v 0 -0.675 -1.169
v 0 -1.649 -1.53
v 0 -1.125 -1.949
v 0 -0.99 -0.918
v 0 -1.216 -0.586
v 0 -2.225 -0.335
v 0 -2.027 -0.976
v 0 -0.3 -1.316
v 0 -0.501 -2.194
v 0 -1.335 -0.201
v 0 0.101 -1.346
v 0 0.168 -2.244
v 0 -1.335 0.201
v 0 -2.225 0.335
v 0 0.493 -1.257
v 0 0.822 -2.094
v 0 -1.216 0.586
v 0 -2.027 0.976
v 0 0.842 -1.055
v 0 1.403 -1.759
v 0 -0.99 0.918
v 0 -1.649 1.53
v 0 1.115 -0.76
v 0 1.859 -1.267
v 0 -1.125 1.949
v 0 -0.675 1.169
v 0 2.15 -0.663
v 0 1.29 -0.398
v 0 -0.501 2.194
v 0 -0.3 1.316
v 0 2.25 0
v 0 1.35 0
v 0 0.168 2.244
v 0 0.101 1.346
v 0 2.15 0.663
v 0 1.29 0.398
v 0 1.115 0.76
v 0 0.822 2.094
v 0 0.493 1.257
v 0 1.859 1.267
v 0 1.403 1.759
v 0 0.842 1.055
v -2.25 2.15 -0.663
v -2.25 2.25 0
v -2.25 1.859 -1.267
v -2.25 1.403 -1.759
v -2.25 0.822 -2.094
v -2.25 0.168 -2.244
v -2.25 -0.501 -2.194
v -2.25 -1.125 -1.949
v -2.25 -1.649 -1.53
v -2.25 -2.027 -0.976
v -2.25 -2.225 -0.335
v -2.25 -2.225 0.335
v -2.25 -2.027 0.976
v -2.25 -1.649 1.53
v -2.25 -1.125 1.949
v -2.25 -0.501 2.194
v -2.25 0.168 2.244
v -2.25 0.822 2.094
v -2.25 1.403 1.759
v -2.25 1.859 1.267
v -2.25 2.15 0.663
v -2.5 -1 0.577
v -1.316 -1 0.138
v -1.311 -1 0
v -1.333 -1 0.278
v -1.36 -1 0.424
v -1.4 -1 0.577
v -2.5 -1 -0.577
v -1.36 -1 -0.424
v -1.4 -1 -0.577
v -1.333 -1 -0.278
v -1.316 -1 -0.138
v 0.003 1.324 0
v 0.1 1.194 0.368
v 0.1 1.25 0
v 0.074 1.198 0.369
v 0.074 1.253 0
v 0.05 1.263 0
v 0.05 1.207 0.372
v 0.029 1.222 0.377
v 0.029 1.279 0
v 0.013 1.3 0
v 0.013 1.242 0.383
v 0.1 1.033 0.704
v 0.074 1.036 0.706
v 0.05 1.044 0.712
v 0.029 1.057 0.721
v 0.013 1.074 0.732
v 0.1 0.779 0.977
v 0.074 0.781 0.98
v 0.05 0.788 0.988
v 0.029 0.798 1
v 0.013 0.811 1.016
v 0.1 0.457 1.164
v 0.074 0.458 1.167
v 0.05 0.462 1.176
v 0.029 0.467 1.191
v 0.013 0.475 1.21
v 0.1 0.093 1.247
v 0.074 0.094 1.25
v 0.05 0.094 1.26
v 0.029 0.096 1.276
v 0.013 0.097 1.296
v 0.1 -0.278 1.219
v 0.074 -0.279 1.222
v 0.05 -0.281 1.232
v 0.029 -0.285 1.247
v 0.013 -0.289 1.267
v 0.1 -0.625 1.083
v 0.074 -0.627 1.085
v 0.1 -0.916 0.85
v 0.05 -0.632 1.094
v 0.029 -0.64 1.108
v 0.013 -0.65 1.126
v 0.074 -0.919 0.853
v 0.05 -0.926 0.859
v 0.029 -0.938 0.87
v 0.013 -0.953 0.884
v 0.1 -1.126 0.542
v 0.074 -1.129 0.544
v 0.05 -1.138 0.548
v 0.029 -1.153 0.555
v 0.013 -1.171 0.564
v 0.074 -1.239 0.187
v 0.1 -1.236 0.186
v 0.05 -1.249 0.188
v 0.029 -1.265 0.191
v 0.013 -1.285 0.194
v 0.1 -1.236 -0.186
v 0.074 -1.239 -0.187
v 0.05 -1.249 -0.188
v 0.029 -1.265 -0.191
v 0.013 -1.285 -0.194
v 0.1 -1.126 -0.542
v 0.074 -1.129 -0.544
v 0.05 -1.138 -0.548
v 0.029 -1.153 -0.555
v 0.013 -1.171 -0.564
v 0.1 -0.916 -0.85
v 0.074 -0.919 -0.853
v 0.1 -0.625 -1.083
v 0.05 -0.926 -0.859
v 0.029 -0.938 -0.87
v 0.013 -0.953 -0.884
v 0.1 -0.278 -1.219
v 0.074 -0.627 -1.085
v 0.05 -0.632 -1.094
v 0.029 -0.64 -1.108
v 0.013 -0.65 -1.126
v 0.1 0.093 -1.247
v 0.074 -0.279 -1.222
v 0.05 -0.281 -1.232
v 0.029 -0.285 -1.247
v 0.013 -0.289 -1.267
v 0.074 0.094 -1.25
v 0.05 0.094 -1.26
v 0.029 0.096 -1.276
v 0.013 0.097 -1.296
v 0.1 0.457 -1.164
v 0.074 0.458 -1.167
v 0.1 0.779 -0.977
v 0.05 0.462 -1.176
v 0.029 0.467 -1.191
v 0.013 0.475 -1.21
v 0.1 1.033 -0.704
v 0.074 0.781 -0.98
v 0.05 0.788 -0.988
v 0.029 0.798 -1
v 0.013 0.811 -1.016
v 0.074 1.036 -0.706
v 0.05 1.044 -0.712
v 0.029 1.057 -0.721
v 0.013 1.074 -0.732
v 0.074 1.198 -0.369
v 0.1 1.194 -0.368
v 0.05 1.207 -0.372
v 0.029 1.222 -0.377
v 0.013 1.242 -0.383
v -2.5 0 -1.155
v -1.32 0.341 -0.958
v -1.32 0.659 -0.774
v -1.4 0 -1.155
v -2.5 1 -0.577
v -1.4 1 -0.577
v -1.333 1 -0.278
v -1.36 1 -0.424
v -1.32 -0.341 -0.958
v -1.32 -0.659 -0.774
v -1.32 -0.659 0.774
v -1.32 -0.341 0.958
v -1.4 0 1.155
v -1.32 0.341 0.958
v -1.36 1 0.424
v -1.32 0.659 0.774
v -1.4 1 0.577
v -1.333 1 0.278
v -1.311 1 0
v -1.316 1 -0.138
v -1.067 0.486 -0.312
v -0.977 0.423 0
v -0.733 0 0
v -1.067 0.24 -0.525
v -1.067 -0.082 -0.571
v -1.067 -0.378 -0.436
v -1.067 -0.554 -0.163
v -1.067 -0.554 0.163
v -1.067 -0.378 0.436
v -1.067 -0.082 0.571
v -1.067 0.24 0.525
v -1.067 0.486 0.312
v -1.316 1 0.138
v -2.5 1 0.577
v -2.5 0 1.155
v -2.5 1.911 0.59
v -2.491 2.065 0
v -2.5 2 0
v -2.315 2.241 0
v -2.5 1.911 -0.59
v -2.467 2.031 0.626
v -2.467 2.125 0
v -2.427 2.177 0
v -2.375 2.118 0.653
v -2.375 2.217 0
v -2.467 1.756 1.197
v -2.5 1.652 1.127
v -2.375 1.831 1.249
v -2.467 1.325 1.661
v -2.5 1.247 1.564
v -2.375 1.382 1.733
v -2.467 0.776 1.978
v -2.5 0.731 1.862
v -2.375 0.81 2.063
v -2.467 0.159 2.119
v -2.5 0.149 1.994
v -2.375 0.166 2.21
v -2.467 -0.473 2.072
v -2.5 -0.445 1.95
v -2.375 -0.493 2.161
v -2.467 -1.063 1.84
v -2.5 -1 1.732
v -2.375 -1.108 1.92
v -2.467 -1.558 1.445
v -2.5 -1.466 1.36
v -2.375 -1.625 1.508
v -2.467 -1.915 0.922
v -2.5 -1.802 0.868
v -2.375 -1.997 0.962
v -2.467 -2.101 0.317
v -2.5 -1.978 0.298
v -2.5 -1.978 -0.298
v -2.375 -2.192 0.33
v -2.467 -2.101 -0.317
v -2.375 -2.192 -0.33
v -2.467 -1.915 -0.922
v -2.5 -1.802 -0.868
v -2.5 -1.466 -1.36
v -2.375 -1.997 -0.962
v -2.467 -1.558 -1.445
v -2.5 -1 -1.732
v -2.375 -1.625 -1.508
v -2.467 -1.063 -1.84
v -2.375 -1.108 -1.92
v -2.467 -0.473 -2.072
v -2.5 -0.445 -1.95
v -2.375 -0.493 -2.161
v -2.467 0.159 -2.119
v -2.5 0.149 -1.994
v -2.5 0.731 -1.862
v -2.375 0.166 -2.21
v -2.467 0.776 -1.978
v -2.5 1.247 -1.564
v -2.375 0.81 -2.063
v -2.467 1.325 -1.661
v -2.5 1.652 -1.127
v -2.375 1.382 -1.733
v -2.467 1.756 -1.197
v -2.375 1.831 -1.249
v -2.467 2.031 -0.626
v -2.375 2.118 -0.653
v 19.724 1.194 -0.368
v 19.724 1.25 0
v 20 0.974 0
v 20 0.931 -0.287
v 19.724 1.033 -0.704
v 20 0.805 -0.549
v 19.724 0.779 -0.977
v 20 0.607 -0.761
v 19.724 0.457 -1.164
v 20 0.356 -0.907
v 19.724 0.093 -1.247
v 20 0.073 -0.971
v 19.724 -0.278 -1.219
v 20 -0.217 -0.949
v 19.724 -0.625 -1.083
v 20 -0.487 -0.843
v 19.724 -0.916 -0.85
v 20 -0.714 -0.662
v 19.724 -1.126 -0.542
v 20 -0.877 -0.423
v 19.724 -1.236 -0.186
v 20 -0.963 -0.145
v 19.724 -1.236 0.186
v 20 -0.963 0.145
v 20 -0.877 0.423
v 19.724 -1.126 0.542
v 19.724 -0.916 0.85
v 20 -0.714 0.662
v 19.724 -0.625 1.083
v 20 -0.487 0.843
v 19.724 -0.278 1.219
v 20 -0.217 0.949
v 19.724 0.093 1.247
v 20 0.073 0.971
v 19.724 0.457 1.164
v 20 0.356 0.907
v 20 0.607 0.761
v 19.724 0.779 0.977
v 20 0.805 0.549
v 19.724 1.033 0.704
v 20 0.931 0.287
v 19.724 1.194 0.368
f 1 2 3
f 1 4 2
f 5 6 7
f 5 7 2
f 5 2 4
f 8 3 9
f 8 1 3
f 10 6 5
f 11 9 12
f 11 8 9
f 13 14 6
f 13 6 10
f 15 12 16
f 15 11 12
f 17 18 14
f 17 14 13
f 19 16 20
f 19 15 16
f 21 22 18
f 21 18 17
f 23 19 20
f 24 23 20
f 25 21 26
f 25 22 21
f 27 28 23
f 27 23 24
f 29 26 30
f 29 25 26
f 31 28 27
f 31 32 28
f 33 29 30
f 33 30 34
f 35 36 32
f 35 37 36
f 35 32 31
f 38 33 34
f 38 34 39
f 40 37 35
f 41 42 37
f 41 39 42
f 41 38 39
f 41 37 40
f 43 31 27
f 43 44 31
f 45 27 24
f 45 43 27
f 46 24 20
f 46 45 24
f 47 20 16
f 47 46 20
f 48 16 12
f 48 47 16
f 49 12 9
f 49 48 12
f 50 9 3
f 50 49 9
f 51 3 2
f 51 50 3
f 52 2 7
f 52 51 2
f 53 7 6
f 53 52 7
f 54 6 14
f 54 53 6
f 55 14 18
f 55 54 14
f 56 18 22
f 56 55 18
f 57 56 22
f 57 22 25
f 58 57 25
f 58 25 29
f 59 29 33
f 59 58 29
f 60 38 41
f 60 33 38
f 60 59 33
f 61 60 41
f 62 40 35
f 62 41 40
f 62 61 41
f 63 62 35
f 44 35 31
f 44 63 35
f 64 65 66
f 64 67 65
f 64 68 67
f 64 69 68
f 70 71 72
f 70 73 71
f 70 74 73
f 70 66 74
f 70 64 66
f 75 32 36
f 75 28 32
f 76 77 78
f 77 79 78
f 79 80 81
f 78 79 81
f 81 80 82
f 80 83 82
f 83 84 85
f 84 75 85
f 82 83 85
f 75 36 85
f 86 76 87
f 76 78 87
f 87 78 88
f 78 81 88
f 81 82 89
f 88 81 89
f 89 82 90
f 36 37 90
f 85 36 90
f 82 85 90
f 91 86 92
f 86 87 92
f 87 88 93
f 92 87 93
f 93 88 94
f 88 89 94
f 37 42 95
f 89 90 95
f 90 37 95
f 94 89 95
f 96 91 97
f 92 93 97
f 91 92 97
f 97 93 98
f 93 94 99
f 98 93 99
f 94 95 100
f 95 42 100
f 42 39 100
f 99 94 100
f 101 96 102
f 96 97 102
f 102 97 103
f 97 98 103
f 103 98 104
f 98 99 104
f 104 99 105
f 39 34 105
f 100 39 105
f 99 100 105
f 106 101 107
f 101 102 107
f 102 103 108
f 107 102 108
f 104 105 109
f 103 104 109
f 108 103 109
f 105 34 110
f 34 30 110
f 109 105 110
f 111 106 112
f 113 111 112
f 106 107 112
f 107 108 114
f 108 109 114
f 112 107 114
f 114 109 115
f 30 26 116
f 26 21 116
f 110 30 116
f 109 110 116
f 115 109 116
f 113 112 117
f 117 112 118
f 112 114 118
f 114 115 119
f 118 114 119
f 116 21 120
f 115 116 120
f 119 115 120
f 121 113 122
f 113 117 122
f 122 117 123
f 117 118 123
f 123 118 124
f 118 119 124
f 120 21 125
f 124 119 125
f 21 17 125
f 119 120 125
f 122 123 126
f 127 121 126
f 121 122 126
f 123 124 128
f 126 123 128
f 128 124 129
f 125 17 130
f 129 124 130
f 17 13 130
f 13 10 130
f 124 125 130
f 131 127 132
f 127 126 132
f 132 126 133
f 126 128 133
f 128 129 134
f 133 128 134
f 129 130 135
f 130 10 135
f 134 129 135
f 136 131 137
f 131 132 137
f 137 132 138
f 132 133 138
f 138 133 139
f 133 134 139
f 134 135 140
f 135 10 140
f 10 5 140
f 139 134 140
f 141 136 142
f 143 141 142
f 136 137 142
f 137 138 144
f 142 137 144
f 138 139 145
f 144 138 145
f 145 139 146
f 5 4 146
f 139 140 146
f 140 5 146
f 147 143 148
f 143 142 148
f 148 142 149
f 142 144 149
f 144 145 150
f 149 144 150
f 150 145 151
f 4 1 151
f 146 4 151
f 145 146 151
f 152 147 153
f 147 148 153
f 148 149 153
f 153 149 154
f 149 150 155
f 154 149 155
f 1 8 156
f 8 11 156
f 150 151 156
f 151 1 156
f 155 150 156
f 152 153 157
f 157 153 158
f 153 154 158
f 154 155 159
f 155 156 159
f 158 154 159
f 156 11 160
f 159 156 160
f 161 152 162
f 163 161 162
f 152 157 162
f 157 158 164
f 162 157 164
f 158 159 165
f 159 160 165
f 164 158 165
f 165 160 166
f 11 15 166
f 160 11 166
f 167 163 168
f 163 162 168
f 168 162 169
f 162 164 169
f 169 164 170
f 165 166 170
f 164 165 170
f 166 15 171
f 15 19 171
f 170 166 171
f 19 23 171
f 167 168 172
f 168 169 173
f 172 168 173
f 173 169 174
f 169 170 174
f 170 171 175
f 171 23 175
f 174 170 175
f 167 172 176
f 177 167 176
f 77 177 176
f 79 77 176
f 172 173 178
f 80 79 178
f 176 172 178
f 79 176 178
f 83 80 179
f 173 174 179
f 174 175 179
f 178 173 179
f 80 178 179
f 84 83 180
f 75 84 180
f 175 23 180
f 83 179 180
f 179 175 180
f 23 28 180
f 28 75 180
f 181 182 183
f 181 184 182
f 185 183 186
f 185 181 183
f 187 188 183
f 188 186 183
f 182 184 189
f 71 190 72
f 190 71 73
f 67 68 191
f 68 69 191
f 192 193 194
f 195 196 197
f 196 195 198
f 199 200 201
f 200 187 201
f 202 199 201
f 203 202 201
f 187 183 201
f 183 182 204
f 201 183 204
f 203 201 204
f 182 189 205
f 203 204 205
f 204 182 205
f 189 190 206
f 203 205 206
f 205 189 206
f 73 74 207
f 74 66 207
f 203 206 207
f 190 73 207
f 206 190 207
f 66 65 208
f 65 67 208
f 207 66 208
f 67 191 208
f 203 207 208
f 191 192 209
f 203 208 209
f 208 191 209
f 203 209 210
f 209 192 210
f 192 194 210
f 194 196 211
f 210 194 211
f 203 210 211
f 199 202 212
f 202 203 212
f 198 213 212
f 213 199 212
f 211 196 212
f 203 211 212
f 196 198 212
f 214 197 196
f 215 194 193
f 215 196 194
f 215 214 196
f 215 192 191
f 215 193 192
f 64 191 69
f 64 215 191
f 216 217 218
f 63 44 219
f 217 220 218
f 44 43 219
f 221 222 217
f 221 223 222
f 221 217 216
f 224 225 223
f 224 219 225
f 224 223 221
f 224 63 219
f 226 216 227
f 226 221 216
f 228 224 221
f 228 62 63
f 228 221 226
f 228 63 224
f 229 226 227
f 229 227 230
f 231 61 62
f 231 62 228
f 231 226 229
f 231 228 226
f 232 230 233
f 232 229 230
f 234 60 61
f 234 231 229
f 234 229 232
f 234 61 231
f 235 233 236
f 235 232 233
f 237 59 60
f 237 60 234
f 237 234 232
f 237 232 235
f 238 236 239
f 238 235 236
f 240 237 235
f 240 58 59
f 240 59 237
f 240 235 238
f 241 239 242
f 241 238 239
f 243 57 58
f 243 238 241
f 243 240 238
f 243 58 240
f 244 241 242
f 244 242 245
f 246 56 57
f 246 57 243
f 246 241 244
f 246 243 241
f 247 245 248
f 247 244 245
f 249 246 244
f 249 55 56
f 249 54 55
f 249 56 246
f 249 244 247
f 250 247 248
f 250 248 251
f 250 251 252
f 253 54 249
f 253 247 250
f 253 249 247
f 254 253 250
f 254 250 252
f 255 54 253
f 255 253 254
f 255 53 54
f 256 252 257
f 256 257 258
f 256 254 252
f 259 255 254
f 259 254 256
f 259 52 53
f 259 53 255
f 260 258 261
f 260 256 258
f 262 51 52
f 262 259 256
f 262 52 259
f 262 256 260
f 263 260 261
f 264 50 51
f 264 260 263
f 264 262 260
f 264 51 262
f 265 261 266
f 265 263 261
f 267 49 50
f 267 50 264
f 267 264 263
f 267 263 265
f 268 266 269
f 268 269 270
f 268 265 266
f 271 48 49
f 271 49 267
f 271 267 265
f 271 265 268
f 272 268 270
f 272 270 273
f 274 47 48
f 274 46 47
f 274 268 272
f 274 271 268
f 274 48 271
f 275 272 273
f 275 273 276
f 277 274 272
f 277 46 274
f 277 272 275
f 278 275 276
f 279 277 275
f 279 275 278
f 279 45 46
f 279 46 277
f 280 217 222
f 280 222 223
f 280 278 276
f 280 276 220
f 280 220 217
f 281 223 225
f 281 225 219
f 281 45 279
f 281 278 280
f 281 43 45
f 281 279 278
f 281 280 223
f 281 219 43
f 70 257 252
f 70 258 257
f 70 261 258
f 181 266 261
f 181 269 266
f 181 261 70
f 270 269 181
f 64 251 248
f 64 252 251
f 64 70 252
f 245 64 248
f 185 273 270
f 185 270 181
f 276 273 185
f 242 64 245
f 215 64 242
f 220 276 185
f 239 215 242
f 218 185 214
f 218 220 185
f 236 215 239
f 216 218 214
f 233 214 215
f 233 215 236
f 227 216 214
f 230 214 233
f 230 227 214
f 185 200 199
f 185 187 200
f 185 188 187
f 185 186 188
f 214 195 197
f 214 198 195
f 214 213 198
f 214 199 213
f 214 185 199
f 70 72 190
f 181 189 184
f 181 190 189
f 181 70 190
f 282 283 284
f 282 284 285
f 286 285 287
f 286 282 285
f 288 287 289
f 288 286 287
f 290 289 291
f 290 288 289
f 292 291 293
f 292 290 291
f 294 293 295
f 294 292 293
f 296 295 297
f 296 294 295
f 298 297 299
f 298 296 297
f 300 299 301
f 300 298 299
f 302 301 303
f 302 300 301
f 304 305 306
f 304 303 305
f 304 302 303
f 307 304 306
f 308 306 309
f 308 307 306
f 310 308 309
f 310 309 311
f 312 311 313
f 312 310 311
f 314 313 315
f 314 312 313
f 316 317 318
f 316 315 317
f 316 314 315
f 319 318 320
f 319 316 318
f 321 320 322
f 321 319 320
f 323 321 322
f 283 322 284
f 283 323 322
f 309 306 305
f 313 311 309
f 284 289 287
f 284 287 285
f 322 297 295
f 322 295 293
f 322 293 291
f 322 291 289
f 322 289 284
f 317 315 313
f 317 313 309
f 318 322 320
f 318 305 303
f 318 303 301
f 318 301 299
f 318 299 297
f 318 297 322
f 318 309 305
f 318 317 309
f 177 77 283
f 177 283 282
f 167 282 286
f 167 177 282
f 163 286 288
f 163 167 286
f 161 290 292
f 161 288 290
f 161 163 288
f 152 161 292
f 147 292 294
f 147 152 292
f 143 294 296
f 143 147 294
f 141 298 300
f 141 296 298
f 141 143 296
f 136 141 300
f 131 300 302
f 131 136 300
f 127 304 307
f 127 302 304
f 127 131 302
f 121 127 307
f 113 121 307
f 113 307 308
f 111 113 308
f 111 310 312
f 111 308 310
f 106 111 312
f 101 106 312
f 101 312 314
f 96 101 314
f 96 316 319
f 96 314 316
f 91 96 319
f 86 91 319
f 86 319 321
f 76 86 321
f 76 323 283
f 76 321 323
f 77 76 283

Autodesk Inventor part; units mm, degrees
ref_plane "YZ Plane" through (0, 0, 0) normal (1, 0, 0) x (0, 1, 0)
ref_plane "XZ Plane" through (0, 0, 0) normal (0, 1, 0) x (-1, 0, 0)
sketch "Szkic1" plane through (0, 0, 0) normal (0, 0, 1) x (1, 0, 0)
  line L0 (-0.7333, 0) -> (20, 0)
  line L1 (20, 0) -> (20, 1.25)
  line L2 (20, 1.25) -> (1.125, 1.25)
  line L3 (1.125, 1.25) -> (0.8488, 1.25)
  line L4 (0.8488, 1.25) -> (0, 1.25)
  line L5 (0, 1.25) -> (0, 2.25)
  line L6 (0, 2.25) -> (-2.5, 2.25)
  line L7 (-2.5, 2.25) -> (-2.5, 1.1547)
  line L8 (-2.5, 1.1547) -> (-1.4, 1.1547)
  line L9 (-1.4, 1.1547) -> (-0.7333, 0)
  line L10 (-7, 0) -> (24.5, 0) projected
  line L11 (0, -0.45) -> (0, 2.7) projected
  line L12 (1.125, 1.25) -> (0, 1.25) construction
  dimension "d1" = 18.875
  dimension "d2" = 0.2762
  dimension "d3" = 2.5
  dimension "d4" = 1.1
  dimension "d5" = 60
  dimension "d6" = 2.5
  dimension "d7" = 2.5
  dimension "d8" = 2.3094
  dimension "d9" = 4.5
  dimension "d26" = 20
revolve "Bryła" add sketch "Szkic1" angle 360 about axis through (-0.7333, 0, 0) along (1, 0, 0)
sketch "Szkic2" plane through (-2.5, 0, 0) normal (-1, 0, 0) x (0, 0, 1)
  circle A0 centre (0, 0) radius 1.1547 projected
  line L0 (0, -3.15) -> (0, 3.15) projected
  line L1 (-3.15, 0) -> (3.15, 0) projected
  line L2 (1.1547, 0) -> (0.5774, -1)
  line L3 (0.5774, -1) -> (-0.5774, -1)
  line L4 (-0.5774, -1) -> (-1.1547, 0)
  line L5 (-1.1547, 0) -> (-0.5774, 1)
  line L6 (-0.5774, 1) -> (0.5774, 1)
  line L7 (0.5774, 1) -> (1.1547, 0)
extrude "Szczelina" add sketch "Szkic2" against normal up to next contours L7 A0 | A0 L2 | L6 L0 A0 | A0 L0 L3 | L0 L6 A0 | A0 L3 L0 | L4 A0 | A0 L5
fillet "Zaokrąglenie1" radius 0.25 1 edges at (-2.5, -2.25, 0)
thread "Gwint" size "M2.5x0.45" class "6g" standard "ISO Metric profile" length 18.875
chamfer "Faza1" distance 0.2761 distance2 0.2761 1 edges at (20, -1.25, 0) measured on face at (20, -0.2763, -0.017)
ref_plane "Work Plane1" through (29, 0, 0) normal (0, -1, 0) x (1, 0, 0)
fillet "Fillet2" radius 0.1 1 edges at (0, -1.25, 0)
equation "\"d1\" = GEL"
equation "\"d3\" = KOH"
equation "\"d4\" = INTI"
equation "\"d6\" = GD"
equation "\"d7\" = BDM"
equation "\"d8\" = 1.1547 * SW"
equation "\"d9\" = KOD"
equation "\"d26\" = NLG"
equation "\"d30\" = R"
equation "\"d17\" = RR"
equation "\"d13\" = GEL"
equation "\"d15\" = -0.5 * SPD + 0.5 * GD"
equation "\"d16\" = GUL"
equation "\"GD\" = NND"
equation "\"NLG\" = 20"
equation "\"GEL\" = 18.875"
equation "\"KOD\" = 4.5"
equation "\"KOH\" = 2.5"
equation "\"INTI\" = 1.1"
equation "\"GAL\" = 0.61345 * PTC"
equation "\"GUL\" = 0.61345 * PTC"
equation "\"BDM\" = NND"
equation "\"SW\" = 2"
equation "\"RR\" = 0.25"
equation "\"SPD\" = NND - 1.2269 * PTC"
equation "\"R\" = 0.1"
equation "\"TOA\" = 30deg"
equation "\"GD1\" = THREADDIA - 1.2269 * PTC"
equation "\"THREADDIA\" = 2.5"
equation "\"FAWI\" = 45deg"
equation "\"ANG\" = 120deg"
equation "\"PTC\" = 0.45"
equation "\"NND\" = 2.5"
equation "\"E0\" = 1.155 * SW"
properties part number "DIN 912 - M2,5 x 20" material "Stal, miękka"
